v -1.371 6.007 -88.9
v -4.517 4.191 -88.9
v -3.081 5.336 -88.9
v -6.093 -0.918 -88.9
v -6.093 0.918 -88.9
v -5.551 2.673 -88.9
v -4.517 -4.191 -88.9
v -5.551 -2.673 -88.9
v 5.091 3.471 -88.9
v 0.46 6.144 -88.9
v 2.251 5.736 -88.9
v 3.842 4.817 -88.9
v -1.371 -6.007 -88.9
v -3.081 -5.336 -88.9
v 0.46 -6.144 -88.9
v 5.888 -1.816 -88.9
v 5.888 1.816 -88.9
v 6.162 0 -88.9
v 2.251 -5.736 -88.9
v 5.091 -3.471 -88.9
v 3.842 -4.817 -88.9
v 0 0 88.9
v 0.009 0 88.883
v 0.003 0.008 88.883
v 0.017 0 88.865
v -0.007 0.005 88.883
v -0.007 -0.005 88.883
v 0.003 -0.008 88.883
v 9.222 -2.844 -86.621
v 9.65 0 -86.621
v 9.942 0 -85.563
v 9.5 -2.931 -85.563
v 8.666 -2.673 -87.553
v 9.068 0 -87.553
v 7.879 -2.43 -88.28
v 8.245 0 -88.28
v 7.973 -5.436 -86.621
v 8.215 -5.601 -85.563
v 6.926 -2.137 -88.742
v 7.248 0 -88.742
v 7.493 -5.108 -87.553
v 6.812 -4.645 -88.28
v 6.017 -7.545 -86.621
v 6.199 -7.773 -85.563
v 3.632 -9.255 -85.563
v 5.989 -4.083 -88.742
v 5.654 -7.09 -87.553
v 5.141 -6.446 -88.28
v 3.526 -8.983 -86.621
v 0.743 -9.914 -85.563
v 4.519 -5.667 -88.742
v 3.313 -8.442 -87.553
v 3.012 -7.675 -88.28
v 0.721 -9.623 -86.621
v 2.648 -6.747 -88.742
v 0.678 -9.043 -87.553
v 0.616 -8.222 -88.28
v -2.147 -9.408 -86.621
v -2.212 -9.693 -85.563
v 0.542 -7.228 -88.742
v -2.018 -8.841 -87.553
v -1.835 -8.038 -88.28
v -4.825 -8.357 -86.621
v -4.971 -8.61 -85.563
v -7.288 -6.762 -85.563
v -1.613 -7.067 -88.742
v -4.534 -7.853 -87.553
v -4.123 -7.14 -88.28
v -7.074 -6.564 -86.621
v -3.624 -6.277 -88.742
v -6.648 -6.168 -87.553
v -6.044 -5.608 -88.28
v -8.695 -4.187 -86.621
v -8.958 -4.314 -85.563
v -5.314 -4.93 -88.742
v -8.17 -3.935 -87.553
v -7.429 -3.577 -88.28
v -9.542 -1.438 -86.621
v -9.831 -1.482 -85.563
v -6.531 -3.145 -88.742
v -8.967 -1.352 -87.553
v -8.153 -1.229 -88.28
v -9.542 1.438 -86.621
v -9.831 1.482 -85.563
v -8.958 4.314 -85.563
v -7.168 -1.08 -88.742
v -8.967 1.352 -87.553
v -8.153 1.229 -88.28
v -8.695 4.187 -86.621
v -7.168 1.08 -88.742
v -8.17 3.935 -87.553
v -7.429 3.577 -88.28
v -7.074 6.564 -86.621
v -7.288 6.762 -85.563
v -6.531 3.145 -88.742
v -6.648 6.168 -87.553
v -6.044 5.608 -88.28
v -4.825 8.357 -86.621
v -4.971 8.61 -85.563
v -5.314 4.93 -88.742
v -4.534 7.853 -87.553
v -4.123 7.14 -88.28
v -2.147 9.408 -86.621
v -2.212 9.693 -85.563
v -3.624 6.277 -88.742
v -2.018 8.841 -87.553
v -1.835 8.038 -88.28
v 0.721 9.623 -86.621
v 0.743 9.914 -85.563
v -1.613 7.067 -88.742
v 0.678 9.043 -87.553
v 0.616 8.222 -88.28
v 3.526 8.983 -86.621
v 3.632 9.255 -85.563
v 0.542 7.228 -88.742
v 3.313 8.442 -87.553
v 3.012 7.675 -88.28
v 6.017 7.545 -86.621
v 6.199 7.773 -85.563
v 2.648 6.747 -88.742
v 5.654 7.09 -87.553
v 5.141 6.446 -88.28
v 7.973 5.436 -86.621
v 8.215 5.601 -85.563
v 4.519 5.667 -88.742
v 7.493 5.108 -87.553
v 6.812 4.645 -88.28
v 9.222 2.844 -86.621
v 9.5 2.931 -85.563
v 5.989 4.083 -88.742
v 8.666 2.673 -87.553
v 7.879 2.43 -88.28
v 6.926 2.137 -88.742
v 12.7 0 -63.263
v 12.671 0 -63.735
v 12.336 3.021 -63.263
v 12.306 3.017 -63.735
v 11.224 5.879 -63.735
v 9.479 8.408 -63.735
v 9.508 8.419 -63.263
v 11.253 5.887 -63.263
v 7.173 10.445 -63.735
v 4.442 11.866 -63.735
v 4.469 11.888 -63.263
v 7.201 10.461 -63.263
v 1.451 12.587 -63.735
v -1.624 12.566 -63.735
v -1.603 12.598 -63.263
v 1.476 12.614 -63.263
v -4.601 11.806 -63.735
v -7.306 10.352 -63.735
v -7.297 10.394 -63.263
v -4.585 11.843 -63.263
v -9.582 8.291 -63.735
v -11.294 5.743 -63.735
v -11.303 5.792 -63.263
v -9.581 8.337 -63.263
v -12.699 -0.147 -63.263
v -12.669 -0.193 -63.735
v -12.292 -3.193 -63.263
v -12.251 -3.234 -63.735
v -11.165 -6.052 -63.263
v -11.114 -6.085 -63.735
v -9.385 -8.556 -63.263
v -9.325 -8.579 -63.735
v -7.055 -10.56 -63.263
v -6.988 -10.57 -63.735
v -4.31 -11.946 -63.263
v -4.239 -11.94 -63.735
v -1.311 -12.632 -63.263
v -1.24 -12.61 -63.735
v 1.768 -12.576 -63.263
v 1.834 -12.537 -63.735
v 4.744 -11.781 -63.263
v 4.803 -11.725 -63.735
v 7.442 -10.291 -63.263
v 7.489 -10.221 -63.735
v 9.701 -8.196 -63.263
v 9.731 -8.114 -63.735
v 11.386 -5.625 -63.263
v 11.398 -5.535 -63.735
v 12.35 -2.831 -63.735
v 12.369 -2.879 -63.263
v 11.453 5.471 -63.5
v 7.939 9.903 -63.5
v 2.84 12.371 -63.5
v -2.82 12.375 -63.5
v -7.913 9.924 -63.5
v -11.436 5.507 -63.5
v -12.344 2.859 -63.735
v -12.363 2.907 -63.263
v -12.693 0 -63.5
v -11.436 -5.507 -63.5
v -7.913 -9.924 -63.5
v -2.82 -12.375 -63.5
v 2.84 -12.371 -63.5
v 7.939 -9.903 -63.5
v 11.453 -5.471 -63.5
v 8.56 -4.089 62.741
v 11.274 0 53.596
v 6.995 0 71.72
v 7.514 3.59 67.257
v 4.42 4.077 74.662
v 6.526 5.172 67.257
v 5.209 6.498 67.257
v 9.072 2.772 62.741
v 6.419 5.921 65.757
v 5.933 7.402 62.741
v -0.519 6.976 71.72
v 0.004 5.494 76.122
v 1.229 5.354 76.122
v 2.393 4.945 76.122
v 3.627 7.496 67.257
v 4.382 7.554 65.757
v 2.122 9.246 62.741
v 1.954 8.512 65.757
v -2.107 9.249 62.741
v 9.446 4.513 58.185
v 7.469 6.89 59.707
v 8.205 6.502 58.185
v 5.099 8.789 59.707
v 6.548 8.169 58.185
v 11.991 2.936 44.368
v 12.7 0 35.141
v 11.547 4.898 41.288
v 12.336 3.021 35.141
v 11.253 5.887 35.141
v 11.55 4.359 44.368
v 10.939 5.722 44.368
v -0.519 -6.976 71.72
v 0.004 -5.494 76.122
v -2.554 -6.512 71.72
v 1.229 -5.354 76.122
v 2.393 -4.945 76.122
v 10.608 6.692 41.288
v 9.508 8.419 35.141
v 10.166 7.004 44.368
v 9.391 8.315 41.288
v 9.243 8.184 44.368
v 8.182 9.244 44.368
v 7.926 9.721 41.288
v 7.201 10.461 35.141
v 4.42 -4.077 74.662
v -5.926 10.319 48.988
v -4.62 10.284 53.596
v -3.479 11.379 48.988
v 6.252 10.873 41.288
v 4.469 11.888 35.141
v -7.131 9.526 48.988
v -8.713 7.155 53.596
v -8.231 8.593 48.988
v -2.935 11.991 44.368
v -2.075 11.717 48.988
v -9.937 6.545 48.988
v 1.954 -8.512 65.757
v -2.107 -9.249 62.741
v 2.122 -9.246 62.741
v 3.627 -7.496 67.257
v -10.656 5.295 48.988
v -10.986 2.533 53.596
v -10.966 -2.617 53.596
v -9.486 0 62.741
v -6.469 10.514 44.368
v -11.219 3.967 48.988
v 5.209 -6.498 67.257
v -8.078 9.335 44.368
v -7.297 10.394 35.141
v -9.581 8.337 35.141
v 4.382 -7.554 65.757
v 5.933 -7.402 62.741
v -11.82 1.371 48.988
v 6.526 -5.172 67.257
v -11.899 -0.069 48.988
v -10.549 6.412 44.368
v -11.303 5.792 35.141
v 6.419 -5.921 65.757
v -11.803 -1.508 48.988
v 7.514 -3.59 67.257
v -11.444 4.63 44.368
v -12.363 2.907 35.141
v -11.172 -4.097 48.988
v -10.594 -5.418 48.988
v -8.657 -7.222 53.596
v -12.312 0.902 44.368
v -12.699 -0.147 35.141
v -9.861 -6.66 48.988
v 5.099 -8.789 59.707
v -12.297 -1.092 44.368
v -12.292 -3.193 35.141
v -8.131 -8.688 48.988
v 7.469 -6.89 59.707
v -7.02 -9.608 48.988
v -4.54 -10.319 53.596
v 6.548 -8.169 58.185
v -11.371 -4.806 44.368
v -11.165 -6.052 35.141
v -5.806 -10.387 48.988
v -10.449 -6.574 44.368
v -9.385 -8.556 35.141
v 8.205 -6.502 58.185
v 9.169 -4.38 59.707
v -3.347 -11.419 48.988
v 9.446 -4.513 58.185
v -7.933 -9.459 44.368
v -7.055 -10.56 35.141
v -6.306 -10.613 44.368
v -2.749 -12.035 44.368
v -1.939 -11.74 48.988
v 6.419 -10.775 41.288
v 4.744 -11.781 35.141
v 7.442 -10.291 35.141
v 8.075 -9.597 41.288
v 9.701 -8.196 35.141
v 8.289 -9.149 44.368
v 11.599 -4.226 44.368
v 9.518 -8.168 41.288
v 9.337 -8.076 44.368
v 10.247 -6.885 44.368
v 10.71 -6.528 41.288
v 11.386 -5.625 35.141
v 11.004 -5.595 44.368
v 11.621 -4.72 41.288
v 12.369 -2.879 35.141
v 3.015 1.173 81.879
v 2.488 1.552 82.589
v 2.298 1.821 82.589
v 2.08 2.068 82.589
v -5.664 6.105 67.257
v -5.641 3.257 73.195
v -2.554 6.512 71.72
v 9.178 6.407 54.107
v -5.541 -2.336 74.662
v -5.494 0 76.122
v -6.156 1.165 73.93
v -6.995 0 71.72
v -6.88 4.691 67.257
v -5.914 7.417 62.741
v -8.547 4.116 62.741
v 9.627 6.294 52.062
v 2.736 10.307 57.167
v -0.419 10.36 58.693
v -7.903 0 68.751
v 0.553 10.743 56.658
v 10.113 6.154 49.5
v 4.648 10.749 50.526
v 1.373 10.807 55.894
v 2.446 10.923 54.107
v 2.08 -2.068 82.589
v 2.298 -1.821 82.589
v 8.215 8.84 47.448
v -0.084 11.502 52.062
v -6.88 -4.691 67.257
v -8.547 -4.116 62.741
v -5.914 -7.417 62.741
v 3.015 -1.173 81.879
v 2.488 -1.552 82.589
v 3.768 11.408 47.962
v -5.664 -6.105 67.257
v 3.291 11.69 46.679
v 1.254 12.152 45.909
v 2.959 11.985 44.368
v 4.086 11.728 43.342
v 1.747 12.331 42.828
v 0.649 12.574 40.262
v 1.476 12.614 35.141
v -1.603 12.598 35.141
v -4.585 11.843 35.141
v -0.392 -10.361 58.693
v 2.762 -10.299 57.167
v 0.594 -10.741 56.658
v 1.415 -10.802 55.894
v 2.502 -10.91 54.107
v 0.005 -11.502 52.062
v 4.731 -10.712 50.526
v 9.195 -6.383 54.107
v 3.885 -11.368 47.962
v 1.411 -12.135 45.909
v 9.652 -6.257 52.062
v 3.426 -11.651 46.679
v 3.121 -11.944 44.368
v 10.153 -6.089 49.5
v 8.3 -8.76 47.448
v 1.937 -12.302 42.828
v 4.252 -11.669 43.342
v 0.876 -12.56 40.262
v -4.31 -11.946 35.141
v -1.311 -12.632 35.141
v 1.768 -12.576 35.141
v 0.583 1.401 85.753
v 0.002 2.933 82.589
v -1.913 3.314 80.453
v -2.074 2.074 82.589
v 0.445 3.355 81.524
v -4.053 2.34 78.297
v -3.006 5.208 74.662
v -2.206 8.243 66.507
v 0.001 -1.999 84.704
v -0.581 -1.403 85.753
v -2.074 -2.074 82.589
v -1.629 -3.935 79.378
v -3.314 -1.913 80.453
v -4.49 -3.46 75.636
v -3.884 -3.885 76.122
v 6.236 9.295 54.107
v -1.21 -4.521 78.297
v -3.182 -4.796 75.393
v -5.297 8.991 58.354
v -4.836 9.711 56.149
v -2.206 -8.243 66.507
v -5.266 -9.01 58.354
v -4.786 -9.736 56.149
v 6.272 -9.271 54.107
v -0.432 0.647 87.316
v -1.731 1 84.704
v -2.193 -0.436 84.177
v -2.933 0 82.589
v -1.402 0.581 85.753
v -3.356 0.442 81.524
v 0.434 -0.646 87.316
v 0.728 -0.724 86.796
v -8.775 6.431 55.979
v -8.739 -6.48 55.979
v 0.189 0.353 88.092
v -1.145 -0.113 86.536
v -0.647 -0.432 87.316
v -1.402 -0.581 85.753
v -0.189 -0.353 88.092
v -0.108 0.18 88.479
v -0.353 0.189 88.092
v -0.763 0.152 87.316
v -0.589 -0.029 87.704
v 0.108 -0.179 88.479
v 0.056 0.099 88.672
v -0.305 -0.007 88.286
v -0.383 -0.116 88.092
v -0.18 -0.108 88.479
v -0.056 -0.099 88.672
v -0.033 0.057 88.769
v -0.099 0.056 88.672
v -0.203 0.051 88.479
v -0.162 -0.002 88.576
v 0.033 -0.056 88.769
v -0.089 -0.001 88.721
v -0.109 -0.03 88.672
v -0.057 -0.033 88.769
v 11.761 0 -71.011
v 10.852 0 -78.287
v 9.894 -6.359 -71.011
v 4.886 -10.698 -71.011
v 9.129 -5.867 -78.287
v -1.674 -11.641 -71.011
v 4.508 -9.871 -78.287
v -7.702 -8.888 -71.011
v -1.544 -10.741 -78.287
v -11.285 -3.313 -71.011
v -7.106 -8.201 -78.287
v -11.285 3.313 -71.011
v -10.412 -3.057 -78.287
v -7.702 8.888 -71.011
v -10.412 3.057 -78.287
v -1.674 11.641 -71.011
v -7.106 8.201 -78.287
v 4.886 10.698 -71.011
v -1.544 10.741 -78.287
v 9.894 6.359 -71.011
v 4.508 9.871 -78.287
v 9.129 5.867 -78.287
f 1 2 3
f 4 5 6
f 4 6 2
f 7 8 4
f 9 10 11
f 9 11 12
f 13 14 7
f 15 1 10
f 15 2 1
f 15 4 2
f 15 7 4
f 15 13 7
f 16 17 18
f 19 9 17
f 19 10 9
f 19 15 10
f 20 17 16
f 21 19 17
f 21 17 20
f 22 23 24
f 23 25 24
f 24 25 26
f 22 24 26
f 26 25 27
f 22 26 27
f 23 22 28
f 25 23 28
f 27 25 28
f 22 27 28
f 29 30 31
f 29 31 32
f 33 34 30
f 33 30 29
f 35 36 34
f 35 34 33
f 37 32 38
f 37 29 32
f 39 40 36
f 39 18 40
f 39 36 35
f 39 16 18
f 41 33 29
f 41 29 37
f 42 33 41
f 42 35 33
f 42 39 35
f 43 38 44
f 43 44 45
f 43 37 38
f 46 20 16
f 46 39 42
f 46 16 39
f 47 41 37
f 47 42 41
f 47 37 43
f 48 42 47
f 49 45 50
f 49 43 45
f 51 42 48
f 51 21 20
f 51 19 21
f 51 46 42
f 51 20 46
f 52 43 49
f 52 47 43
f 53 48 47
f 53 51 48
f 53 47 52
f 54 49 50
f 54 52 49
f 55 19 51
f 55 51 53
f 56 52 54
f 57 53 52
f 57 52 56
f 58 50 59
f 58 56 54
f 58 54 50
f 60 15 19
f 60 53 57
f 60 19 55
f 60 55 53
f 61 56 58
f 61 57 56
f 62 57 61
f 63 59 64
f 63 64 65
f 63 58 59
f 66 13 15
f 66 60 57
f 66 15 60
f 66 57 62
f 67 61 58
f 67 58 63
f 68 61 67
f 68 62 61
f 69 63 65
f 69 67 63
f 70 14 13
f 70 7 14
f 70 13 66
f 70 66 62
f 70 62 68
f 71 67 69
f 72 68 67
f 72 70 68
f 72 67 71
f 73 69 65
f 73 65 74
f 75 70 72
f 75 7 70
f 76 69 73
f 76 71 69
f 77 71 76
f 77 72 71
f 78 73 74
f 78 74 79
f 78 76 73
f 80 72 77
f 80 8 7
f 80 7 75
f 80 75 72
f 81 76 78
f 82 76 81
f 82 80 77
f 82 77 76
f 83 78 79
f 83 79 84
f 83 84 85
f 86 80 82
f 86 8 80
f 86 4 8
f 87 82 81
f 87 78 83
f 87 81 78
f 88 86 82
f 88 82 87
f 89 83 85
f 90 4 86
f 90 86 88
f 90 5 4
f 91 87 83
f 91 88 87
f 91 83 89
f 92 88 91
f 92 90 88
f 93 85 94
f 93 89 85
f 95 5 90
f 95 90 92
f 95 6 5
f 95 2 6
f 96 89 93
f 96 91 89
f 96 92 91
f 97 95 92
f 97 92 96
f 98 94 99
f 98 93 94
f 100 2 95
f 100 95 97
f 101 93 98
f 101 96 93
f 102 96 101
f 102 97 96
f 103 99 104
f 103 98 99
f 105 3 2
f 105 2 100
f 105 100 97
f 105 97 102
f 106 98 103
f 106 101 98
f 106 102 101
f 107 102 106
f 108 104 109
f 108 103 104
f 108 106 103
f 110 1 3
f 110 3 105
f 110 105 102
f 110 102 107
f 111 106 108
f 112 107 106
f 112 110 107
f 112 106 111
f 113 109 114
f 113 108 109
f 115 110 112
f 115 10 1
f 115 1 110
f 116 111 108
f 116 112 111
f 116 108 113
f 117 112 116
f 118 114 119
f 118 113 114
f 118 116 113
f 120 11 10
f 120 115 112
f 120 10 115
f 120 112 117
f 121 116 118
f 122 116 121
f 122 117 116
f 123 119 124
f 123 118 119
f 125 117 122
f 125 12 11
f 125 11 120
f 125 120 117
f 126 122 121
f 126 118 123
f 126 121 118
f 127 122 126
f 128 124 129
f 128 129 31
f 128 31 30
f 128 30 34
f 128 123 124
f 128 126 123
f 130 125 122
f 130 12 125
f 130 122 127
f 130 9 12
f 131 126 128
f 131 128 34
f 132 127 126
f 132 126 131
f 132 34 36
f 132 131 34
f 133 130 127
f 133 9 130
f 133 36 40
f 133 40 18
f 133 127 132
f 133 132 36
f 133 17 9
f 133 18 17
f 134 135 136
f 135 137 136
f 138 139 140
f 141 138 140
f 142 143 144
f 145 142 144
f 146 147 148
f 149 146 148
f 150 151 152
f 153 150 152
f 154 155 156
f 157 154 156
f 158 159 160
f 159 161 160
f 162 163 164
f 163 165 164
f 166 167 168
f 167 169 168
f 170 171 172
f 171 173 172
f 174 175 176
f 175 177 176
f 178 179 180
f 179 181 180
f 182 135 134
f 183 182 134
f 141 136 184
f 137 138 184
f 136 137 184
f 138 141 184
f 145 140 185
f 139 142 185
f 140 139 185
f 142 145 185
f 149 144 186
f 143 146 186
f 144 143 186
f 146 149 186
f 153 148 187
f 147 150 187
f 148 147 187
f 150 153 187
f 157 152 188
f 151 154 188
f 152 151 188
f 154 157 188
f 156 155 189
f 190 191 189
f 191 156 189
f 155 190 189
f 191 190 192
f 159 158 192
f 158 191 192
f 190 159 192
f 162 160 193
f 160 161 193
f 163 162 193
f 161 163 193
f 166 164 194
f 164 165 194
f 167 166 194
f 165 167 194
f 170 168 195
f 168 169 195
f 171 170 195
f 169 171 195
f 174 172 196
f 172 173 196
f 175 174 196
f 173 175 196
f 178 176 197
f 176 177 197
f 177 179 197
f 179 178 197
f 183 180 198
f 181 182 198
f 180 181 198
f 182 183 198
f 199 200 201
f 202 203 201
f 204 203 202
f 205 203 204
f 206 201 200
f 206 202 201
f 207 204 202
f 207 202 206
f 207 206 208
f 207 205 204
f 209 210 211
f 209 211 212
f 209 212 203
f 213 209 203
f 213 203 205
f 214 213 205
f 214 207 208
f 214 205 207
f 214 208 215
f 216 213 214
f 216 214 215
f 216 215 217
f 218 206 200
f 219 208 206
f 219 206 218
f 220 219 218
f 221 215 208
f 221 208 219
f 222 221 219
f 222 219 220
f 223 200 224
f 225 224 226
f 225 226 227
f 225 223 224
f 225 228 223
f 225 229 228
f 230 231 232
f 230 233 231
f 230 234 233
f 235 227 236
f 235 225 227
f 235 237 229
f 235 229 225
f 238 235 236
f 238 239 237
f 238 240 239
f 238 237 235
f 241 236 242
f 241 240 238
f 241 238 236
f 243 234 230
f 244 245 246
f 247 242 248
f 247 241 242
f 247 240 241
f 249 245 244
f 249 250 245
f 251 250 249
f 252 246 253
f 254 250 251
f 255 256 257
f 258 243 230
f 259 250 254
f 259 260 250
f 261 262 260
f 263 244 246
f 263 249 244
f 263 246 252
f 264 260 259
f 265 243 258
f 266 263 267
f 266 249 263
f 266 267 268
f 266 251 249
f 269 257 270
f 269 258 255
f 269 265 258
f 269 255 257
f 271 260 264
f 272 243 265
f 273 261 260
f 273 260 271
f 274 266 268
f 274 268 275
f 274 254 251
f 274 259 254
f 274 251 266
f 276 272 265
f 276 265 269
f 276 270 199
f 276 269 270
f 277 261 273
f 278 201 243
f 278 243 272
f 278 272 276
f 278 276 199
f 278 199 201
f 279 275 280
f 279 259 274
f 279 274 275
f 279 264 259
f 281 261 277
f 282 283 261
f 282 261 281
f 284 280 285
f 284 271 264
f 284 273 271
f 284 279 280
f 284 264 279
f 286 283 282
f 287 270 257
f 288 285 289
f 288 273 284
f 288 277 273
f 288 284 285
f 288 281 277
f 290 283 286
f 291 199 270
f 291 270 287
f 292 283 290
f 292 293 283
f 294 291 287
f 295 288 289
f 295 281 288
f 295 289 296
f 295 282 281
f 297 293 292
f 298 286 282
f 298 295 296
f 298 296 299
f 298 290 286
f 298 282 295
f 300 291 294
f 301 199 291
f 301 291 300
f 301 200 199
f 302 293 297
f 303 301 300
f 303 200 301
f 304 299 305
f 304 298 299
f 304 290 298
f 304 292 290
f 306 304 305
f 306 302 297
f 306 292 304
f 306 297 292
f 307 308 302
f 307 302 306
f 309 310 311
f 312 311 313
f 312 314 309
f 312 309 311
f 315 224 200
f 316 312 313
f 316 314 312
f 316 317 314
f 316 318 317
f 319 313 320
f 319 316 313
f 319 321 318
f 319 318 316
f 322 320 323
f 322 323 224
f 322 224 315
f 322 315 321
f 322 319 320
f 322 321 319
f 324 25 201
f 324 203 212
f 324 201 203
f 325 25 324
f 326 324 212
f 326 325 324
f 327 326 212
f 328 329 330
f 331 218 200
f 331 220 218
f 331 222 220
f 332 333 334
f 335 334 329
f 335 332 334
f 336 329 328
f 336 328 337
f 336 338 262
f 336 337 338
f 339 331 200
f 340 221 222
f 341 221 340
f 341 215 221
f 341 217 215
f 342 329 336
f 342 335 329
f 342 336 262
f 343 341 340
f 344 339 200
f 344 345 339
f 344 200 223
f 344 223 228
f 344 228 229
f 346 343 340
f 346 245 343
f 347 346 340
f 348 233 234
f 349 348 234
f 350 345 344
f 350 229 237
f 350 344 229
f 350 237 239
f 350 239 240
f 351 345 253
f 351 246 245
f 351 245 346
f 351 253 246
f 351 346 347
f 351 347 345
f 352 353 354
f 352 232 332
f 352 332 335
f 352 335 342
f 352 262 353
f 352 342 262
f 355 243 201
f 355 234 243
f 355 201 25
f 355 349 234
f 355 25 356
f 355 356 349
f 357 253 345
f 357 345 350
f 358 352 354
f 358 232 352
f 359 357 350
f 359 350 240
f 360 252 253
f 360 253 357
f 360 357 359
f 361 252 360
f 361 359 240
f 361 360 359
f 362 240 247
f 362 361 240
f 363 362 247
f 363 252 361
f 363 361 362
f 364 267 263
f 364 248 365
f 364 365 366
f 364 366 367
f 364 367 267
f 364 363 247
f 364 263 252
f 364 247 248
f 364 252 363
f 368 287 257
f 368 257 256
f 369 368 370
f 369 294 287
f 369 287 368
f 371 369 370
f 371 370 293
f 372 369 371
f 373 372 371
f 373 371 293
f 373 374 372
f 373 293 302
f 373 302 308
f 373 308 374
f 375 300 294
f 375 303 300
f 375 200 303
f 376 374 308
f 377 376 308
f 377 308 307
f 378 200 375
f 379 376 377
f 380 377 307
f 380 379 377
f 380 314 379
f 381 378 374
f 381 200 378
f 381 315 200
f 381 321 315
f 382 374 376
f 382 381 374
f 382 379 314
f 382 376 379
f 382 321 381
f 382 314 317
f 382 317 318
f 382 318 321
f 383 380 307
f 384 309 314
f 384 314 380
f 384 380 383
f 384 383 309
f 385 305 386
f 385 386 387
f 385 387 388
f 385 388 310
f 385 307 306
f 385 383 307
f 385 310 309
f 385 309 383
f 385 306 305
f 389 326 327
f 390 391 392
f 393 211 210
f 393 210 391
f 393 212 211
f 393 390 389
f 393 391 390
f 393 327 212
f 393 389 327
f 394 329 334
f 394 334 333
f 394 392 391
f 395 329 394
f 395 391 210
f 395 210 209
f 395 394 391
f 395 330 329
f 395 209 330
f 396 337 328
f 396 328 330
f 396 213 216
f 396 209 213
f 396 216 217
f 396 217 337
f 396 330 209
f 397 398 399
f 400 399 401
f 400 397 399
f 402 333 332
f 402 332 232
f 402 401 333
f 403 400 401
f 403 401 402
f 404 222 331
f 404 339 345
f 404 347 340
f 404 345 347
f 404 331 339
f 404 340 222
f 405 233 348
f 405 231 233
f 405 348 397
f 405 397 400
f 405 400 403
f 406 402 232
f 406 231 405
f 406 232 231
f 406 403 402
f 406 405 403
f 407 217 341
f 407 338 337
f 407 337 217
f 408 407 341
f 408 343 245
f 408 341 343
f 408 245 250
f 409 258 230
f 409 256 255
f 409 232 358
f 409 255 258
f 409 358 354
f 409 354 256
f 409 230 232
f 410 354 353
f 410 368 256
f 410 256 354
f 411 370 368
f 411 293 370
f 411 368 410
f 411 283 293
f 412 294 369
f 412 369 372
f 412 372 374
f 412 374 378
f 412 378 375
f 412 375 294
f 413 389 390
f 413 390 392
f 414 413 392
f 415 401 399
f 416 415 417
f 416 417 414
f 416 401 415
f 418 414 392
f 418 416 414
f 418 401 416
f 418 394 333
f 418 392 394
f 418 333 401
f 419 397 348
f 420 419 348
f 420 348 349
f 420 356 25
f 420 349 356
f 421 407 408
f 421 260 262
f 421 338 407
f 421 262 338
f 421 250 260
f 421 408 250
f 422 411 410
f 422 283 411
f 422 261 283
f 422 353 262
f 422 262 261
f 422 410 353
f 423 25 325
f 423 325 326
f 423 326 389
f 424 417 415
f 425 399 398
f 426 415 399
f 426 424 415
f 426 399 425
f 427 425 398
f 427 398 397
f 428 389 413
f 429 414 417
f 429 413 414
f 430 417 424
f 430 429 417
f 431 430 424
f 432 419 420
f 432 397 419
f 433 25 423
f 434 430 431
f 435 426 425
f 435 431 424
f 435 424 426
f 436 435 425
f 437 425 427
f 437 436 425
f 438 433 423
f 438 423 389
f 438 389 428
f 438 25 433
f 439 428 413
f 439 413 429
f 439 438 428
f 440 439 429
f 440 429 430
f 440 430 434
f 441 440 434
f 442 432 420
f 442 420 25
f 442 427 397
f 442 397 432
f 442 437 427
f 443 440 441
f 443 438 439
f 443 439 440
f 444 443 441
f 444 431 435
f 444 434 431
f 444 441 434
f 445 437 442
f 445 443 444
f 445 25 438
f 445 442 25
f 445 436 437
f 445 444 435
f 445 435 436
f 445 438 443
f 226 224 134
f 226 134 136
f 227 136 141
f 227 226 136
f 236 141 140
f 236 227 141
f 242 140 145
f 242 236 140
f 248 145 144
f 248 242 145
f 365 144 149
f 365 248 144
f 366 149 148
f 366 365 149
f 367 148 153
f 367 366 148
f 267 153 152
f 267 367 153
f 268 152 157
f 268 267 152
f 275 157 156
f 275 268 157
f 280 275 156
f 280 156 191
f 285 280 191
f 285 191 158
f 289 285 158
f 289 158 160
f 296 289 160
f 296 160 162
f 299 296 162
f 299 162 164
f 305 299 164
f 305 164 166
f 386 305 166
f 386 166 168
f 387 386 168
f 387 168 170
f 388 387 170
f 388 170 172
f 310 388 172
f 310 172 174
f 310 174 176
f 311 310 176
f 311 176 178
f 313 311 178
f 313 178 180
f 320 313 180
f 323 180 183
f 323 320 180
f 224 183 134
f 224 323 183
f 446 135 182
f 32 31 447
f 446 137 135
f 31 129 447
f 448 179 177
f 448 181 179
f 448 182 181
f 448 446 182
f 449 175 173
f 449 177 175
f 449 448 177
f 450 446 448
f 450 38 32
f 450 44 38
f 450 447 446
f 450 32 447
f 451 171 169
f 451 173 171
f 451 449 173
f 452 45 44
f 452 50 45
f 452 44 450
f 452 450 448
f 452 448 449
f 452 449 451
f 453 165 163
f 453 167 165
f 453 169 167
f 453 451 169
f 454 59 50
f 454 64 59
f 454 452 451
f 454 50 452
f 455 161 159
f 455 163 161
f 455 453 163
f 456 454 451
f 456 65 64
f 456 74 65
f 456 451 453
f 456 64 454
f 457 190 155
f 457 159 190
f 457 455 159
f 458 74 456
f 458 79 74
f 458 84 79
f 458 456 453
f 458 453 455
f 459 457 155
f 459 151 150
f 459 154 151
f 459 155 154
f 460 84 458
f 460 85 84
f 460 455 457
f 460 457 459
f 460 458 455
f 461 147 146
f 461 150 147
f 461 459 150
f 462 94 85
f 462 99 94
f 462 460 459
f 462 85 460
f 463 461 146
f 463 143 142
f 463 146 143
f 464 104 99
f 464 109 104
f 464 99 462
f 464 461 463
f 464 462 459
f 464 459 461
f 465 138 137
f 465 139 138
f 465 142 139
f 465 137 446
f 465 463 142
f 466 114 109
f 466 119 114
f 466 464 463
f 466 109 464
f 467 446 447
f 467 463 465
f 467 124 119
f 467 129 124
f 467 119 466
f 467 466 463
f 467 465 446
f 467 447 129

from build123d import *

# Parameters (mm, degrees)
F0_R       = 12.7
F1_DEPTH   = 63.5
F2_R       = 12.7
F6_R       = 120.1325893594
F1_FACE1_R = 12.7
F8_R       = 9.525
F10_R      = 3.81


with BuildPart() as f1:
    # F0 (on Top) → F1 (new body, symmetric)
    with BuildSketch(Plane.XY):
        Circle(F0_R)
    extrude(amount=F1_DEPTH, both=True)

    # F2 (on face) → F5 section 0
    with BuildSketch(Plane.XY.offset(63.5), mode=Mode.PRIVATE) as f5_s0:
        Circle(F2_R)
    loft([Vertex(0, 0, 88.9), f5_s0.sketch])

    # F6
    f6_edges = [f1.edges().sort_by_distance(p)[0] for p in [
        (6.35, 0, 76.2),
        (-12.7, 0, 63.5),
    ]]
    fillet(f6_edges, radius=F6_R)

    # F1_face1 (on face) → F9 section 0
    with BuildSketch(Plane(origin=(0, 0, -63.5), x_dir=(1, 0, 0), z_dir=(0, 0, -1))):
        Circle(F1_FACE1_R)
    # F8 (on offset) → F9 section 1
    with BuildSketch(Plane(origin=(0, 0, -88.9), x_dir=(1, 0, 0), z_dir=(0, 0, -1))):
        Circle(F8_R)
    loft()

    # F10
    f10_edges = [f1.edges().sort_by_distance(p)[0] for p in [
        (-12.7, 0, -63.5),
        (11.1125, 0, -76.2),
        (-9.525, 0, -88.9),
    ]]
    fillet(f10_edges, radius=F10_R)


solid = f1.part
